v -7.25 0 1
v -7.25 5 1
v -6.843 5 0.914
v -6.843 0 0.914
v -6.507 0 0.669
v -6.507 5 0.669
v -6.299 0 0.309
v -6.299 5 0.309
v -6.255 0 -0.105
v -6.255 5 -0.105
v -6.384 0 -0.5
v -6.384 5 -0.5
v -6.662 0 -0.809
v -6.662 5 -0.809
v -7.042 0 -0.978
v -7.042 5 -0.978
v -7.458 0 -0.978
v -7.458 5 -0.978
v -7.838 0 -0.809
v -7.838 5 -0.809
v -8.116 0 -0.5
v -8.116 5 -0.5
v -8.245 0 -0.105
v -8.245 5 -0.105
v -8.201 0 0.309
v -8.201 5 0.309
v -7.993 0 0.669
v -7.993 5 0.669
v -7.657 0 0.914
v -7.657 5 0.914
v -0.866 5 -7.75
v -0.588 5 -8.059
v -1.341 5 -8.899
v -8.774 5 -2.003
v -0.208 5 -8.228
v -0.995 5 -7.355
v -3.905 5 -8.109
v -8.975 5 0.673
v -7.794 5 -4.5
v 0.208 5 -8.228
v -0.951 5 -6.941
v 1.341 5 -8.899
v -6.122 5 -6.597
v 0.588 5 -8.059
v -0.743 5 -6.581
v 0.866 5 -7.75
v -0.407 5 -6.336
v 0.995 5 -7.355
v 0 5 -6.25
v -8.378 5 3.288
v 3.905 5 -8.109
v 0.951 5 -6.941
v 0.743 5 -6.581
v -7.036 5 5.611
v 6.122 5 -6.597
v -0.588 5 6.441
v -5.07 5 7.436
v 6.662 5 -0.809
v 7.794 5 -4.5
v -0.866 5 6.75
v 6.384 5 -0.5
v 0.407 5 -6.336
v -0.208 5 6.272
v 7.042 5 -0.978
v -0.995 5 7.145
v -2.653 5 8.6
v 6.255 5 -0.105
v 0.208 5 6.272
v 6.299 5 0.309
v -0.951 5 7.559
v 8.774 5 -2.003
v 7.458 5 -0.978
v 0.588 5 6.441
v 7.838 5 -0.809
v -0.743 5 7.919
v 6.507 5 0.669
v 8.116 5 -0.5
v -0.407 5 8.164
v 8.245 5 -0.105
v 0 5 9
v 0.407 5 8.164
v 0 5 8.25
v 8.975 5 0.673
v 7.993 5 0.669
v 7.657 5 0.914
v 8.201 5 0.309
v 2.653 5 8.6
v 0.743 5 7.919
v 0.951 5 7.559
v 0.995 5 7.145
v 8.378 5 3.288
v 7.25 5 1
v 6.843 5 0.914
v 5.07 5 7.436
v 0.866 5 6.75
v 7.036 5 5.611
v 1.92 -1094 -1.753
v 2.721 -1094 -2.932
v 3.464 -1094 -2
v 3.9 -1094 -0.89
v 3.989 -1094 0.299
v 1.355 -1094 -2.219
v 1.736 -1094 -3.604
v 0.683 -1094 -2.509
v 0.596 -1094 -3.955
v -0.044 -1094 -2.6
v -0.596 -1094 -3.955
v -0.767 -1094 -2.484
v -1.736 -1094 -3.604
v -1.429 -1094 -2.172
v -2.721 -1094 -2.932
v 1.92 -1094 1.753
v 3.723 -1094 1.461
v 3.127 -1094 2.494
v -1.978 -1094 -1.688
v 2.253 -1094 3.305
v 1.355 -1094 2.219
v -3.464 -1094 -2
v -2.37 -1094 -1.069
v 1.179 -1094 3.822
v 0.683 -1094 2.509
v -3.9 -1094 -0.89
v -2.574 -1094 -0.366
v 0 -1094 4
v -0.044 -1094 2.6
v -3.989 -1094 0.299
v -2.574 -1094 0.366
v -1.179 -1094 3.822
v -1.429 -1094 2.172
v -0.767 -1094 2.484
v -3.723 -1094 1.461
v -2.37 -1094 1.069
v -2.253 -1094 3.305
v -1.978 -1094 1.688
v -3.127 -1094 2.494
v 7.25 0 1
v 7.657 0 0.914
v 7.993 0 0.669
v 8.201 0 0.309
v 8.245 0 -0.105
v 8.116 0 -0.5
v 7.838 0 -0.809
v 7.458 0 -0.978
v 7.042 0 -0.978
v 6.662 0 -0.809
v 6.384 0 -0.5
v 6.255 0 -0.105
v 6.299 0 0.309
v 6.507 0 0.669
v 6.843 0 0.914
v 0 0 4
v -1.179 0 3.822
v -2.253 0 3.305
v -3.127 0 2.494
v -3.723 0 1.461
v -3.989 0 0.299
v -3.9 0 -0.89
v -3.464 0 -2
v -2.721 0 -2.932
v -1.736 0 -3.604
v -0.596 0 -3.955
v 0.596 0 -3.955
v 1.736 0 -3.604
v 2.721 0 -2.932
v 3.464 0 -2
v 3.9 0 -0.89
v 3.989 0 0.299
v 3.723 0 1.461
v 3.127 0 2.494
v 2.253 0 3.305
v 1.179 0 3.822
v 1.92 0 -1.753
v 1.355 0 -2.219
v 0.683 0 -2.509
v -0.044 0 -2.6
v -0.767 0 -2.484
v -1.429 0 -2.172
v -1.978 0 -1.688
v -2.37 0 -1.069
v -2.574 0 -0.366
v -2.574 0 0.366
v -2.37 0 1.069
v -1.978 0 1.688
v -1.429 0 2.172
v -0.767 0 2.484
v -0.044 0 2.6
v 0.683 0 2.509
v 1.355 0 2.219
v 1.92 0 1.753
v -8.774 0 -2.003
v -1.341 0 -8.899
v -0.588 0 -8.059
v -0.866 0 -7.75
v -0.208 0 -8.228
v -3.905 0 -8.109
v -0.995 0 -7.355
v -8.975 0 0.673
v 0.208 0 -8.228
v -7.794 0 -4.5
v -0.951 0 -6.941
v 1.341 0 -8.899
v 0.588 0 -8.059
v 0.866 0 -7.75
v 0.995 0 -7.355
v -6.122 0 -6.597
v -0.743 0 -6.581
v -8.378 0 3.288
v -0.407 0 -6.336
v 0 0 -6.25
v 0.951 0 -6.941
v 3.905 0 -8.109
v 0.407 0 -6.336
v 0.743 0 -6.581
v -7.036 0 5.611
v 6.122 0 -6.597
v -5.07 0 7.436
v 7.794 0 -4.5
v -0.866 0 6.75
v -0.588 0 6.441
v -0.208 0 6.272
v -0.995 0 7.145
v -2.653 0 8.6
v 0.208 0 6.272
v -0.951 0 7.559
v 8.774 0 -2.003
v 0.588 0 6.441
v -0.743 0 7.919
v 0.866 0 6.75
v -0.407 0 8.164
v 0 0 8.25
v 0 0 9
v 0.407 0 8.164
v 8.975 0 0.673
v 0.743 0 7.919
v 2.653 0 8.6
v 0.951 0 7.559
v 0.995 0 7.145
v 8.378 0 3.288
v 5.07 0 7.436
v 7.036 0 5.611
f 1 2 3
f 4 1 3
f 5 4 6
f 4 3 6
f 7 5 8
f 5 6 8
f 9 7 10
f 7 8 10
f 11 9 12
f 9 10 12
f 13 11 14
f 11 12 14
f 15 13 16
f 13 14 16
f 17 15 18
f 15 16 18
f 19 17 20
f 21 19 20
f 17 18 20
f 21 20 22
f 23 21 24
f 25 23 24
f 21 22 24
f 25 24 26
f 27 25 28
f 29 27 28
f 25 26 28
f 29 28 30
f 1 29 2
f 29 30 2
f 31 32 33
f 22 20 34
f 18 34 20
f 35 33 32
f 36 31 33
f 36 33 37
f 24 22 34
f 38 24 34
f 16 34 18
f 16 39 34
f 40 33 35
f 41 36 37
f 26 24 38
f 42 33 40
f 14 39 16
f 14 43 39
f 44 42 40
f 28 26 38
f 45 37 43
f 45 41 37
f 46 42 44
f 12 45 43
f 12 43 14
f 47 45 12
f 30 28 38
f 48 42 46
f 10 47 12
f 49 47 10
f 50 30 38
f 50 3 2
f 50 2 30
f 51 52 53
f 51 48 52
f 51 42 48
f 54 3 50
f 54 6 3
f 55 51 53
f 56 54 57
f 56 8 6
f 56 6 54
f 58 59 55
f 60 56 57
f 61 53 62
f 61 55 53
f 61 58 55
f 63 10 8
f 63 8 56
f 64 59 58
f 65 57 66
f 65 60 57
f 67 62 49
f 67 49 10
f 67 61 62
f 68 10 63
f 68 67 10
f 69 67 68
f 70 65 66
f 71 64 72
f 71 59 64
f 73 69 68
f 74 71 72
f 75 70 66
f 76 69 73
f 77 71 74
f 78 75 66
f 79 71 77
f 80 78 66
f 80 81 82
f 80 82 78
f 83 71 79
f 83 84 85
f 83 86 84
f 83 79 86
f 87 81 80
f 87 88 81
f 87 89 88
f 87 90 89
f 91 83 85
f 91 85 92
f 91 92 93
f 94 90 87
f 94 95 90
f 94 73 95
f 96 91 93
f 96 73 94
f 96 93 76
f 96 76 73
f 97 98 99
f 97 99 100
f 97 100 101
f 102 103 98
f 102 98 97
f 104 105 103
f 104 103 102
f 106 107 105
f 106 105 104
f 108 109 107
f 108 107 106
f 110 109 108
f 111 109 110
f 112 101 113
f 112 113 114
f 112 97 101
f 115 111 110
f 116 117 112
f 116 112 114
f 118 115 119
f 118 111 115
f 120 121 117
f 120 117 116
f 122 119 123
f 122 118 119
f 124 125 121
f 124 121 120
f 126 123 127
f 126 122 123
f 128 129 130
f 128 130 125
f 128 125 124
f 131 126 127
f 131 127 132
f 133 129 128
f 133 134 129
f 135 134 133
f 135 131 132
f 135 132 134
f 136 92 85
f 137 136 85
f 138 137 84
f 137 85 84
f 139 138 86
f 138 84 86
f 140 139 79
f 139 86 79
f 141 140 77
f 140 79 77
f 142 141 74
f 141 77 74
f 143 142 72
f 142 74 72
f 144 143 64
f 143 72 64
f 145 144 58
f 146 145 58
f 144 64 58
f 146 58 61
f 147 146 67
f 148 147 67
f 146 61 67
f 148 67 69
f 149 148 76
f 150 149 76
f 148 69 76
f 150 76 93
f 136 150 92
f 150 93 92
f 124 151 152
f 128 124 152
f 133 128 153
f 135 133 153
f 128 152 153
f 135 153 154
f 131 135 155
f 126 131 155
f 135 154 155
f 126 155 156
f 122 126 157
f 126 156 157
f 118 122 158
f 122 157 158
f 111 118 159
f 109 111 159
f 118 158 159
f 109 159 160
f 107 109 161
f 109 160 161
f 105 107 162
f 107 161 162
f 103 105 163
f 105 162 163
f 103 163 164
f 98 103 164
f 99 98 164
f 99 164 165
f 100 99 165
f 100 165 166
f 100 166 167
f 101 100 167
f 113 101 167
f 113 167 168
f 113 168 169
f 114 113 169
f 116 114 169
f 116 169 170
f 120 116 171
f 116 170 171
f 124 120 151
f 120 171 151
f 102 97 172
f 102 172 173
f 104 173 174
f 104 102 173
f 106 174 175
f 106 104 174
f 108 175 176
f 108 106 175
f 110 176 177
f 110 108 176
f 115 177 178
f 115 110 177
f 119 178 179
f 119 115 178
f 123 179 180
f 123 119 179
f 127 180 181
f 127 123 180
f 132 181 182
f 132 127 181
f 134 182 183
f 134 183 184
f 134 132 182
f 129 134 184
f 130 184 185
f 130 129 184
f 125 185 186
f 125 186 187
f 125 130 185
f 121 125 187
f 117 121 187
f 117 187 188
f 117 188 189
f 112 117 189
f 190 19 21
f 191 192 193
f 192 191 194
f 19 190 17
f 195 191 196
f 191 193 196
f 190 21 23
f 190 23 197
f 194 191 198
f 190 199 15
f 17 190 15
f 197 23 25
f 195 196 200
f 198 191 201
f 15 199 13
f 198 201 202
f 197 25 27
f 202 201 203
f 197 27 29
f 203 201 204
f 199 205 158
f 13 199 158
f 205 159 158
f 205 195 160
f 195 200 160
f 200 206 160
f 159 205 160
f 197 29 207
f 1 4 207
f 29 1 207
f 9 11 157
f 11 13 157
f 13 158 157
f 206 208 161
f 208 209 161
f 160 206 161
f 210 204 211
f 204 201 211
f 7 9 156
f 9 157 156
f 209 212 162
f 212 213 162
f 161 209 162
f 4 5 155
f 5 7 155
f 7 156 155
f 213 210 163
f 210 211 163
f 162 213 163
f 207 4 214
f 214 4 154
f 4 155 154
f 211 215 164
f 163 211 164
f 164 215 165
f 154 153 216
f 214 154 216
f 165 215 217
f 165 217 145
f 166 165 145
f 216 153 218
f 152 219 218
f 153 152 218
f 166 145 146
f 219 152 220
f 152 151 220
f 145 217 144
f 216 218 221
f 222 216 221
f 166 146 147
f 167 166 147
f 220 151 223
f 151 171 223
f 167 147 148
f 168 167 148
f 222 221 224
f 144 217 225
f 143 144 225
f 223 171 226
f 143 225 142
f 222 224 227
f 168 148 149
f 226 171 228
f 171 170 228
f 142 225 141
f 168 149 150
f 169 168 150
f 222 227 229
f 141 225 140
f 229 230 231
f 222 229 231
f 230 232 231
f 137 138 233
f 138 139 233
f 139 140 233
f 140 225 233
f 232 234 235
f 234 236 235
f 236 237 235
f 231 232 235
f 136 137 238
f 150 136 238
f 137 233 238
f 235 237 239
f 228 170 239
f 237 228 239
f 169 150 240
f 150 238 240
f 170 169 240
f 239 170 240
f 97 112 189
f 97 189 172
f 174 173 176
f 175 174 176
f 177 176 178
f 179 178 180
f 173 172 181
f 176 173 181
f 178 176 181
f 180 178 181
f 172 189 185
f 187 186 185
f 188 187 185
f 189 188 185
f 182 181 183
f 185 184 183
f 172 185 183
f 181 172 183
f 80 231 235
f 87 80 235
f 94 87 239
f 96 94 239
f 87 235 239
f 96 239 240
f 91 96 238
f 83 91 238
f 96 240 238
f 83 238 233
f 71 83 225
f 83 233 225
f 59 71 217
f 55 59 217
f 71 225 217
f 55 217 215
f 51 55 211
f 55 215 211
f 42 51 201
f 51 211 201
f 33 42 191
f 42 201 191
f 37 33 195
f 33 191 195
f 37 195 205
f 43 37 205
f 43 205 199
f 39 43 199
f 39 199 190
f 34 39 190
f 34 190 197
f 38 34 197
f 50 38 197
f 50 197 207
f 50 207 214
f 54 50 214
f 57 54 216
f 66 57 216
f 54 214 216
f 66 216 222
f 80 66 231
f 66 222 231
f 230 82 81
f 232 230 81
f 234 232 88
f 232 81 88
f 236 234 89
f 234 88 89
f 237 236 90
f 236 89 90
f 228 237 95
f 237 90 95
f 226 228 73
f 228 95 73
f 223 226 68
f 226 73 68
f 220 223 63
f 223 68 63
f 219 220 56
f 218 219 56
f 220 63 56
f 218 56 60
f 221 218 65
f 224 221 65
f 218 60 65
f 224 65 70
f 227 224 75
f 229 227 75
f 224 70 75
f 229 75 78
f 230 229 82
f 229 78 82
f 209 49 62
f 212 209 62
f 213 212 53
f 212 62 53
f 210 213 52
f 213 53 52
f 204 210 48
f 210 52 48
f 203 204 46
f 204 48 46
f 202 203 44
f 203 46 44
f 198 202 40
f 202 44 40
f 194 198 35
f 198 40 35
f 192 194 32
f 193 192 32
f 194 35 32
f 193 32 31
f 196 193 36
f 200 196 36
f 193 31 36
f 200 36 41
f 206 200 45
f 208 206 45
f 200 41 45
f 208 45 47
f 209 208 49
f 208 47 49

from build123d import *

# Parameters (mm, degrees)
SKETCH1_R                = 9
BRACKETMOUNT_DEPTH       = 5
SKETCH2_R                = 1
BRACKET_MOUNTHOLES_DEPTH = 5
SKETCH3_R                = 4
STEPPERSLEEVE_DEPTH      = 1094
ORIENTATIONNUB_DEPTH     = 1094


with BuildPart() as part:
    # Sketch1 → BracketMount (new body)
    with BuildSketch(Plane(origin=(0, 0, 0), x_dir=(1, 0, 0), z_dir=(0, 1, 0))):
        with Locations(Location((0, 0, 0), (0, 0, 270))):
            Circle(SKETCH1_R)
    extrude(amount=BRACKETMOUNT_DEPTH)

    # Sketch2 → Bracket-MountHoles (cut)
    with BuildSketch(Plane(origin=(0, 5, 0), x_dir=(1, 0, 0), z_dir=(0, 1, 0))):
        with Locations(Location((0, 7.25, 0), (0, 0, 270))):
            Circle(SKETCH2_R)
        with Locations(Location((7.25, 0, 0), (0, 0, 270))):
            Circle(SKETCH2_R)
        with Locations(Location((0, -7.25, 0), (0, 0, 270))):
            Circle(SKETCH2_R)
        with Locations(Location((-7.25, 0, 0), (0, 0, 270))):
            Circle(SKETCH2_R)
    extrude(amount=-BRACKET_MOUNTHOLES_DEPTH, mode=Mode.SUBTRACT)

    # Sketch3 → StepperSleeve (add)
    with BuildSketch(Plane.XZ):
        with Locations(Location((0, 0, 0), (0, 0, 90))):
            Circle(SKETCH3_R)
    extrude(amount=STEPPERSLEEVE_DEPTH)

    # Sketch5 → OrientationNub (cut)
    with BuildSketch(Plane.XZ.offset(1094)):
        with BuildLine():
            Line((1.92, 1.75316856), (1.92, -1.75316856))
            ThreePointArc((1.92, -1.75316856), (-2.6, 0), (1.92, 1.75316856))
        make_face()
    extrude(amount=-ORIENTATIONNUB_DEPTH, mode=Mode.SUBTRACT)


solid = part.part
